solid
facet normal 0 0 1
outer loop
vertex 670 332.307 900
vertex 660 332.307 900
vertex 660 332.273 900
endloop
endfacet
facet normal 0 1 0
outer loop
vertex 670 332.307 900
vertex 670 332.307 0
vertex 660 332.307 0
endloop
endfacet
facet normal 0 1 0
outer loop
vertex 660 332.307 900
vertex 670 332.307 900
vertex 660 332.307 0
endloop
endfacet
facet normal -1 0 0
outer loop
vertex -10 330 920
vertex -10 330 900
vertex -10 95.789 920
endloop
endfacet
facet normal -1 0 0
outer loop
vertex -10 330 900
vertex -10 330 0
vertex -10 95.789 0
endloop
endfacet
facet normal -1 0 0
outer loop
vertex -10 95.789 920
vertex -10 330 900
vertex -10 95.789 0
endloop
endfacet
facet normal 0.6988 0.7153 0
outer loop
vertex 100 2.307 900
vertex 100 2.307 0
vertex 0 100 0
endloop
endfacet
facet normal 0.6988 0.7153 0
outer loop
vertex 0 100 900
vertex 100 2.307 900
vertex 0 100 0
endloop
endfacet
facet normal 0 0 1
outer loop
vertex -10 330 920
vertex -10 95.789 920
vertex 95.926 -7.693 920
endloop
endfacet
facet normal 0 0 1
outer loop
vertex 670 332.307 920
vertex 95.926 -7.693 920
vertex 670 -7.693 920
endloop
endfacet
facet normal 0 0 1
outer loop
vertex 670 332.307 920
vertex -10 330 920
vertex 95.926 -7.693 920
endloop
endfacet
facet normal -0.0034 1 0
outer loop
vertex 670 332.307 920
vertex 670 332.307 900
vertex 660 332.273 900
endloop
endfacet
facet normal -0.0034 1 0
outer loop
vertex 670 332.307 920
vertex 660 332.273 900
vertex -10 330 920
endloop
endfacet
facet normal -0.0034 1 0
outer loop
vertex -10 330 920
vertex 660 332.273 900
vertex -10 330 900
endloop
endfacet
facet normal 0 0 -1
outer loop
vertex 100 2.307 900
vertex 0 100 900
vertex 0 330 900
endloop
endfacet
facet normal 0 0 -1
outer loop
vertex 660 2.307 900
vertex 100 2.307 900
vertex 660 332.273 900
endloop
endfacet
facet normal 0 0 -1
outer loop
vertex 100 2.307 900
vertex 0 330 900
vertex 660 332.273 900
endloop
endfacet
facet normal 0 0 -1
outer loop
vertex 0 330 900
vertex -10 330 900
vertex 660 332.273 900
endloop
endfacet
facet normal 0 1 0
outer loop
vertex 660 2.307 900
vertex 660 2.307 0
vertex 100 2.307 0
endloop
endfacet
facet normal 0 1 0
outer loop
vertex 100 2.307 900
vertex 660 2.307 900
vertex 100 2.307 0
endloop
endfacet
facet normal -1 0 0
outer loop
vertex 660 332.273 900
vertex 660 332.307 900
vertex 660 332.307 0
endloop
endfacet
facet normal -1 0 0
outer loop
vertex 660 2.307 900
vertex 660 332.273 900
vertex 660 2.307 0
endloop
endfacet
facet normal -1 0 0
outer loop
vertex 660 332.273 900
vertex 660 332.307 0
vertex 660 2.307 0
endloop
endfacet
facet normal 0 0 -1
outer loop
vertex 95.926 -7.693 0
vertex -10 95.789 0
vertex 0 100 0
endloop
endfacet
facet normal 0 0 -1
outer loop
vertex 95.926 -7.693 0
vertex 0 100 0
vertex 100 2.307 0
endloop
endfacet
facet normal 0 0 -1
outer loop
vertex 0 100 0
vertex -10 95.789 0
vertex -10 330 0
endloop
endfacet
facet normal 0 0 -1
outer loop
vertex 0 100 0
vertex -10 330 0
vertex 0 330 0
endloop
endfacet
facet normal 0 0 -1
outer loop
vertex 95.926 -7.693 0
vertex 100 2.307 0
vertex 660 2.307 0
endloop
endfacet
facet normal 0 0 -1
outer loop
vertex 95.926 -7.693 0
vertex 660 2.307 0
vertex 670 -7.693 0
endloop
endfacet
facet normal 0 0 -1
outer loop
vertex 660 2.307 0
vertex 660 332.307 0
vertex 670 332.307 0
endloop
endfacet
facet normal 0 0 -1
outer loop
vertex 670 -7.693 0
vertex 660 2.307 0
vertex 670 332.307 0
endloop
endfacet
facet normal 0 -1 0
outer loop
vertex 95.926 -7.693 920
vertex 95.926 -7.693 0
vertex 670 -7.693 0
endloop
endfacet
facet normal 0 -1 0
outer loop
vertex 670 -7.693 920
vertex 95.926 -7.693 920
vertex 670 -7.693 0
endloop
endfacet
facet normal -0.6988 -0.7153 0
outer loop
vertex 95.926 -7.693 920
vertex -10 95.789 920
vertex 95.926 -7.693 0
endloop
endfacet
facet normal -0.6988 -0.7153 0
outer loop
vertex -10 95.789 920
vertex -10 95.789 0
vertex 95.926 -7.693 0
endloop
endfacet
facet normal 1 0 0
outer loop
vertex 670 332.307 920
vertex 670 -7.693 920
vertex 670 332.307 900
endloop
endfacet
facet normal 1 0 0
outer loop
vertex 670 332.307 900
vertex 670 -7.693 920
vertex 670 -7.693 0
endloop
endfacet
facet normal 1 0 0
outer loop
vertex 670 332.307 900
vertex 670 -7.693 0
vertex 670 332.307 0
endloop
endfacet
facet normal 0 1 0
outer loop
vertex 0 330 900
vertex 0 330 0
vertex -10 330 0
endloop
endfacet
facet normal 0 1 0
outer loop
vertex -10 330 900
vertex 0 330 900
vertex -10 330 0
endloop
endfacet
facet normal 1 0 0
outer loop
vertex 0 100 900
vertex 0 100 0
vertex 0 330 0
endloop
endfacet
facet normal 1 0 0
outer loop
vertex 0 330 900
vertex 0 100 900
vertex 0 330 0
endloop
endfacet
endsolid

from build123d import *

# Parameters (mm, degrees)
F1_DEPTH = 900
F3_DEPTH = 20


with BuildPart() as f1:
    # F0 (on Top) → F1 (new body)
    with BuildSketch(Plane.XY):
        Polygon((0, 100), (0, 330), (-10, 330), (-10, 95.789346), (95.926052, -7.69314), (670, -7.69314), (670, 332.30686), (660, 332.30686), (660, 2.30686), (100, 2.30686), align=None)
    extrude(amount=F1_DEPTH)

    # F2 (on face) → F3 (join)
    with BuildSketch(Plane.XY.offset(900)):
        Polygon((670, 332.30686), (-10, 330), (-10, 95.789346), (95.926052, -7.69314), (670, -7.69314), align=None)
    extrude(amount=F3_DEPTH)


solid = f1.part
